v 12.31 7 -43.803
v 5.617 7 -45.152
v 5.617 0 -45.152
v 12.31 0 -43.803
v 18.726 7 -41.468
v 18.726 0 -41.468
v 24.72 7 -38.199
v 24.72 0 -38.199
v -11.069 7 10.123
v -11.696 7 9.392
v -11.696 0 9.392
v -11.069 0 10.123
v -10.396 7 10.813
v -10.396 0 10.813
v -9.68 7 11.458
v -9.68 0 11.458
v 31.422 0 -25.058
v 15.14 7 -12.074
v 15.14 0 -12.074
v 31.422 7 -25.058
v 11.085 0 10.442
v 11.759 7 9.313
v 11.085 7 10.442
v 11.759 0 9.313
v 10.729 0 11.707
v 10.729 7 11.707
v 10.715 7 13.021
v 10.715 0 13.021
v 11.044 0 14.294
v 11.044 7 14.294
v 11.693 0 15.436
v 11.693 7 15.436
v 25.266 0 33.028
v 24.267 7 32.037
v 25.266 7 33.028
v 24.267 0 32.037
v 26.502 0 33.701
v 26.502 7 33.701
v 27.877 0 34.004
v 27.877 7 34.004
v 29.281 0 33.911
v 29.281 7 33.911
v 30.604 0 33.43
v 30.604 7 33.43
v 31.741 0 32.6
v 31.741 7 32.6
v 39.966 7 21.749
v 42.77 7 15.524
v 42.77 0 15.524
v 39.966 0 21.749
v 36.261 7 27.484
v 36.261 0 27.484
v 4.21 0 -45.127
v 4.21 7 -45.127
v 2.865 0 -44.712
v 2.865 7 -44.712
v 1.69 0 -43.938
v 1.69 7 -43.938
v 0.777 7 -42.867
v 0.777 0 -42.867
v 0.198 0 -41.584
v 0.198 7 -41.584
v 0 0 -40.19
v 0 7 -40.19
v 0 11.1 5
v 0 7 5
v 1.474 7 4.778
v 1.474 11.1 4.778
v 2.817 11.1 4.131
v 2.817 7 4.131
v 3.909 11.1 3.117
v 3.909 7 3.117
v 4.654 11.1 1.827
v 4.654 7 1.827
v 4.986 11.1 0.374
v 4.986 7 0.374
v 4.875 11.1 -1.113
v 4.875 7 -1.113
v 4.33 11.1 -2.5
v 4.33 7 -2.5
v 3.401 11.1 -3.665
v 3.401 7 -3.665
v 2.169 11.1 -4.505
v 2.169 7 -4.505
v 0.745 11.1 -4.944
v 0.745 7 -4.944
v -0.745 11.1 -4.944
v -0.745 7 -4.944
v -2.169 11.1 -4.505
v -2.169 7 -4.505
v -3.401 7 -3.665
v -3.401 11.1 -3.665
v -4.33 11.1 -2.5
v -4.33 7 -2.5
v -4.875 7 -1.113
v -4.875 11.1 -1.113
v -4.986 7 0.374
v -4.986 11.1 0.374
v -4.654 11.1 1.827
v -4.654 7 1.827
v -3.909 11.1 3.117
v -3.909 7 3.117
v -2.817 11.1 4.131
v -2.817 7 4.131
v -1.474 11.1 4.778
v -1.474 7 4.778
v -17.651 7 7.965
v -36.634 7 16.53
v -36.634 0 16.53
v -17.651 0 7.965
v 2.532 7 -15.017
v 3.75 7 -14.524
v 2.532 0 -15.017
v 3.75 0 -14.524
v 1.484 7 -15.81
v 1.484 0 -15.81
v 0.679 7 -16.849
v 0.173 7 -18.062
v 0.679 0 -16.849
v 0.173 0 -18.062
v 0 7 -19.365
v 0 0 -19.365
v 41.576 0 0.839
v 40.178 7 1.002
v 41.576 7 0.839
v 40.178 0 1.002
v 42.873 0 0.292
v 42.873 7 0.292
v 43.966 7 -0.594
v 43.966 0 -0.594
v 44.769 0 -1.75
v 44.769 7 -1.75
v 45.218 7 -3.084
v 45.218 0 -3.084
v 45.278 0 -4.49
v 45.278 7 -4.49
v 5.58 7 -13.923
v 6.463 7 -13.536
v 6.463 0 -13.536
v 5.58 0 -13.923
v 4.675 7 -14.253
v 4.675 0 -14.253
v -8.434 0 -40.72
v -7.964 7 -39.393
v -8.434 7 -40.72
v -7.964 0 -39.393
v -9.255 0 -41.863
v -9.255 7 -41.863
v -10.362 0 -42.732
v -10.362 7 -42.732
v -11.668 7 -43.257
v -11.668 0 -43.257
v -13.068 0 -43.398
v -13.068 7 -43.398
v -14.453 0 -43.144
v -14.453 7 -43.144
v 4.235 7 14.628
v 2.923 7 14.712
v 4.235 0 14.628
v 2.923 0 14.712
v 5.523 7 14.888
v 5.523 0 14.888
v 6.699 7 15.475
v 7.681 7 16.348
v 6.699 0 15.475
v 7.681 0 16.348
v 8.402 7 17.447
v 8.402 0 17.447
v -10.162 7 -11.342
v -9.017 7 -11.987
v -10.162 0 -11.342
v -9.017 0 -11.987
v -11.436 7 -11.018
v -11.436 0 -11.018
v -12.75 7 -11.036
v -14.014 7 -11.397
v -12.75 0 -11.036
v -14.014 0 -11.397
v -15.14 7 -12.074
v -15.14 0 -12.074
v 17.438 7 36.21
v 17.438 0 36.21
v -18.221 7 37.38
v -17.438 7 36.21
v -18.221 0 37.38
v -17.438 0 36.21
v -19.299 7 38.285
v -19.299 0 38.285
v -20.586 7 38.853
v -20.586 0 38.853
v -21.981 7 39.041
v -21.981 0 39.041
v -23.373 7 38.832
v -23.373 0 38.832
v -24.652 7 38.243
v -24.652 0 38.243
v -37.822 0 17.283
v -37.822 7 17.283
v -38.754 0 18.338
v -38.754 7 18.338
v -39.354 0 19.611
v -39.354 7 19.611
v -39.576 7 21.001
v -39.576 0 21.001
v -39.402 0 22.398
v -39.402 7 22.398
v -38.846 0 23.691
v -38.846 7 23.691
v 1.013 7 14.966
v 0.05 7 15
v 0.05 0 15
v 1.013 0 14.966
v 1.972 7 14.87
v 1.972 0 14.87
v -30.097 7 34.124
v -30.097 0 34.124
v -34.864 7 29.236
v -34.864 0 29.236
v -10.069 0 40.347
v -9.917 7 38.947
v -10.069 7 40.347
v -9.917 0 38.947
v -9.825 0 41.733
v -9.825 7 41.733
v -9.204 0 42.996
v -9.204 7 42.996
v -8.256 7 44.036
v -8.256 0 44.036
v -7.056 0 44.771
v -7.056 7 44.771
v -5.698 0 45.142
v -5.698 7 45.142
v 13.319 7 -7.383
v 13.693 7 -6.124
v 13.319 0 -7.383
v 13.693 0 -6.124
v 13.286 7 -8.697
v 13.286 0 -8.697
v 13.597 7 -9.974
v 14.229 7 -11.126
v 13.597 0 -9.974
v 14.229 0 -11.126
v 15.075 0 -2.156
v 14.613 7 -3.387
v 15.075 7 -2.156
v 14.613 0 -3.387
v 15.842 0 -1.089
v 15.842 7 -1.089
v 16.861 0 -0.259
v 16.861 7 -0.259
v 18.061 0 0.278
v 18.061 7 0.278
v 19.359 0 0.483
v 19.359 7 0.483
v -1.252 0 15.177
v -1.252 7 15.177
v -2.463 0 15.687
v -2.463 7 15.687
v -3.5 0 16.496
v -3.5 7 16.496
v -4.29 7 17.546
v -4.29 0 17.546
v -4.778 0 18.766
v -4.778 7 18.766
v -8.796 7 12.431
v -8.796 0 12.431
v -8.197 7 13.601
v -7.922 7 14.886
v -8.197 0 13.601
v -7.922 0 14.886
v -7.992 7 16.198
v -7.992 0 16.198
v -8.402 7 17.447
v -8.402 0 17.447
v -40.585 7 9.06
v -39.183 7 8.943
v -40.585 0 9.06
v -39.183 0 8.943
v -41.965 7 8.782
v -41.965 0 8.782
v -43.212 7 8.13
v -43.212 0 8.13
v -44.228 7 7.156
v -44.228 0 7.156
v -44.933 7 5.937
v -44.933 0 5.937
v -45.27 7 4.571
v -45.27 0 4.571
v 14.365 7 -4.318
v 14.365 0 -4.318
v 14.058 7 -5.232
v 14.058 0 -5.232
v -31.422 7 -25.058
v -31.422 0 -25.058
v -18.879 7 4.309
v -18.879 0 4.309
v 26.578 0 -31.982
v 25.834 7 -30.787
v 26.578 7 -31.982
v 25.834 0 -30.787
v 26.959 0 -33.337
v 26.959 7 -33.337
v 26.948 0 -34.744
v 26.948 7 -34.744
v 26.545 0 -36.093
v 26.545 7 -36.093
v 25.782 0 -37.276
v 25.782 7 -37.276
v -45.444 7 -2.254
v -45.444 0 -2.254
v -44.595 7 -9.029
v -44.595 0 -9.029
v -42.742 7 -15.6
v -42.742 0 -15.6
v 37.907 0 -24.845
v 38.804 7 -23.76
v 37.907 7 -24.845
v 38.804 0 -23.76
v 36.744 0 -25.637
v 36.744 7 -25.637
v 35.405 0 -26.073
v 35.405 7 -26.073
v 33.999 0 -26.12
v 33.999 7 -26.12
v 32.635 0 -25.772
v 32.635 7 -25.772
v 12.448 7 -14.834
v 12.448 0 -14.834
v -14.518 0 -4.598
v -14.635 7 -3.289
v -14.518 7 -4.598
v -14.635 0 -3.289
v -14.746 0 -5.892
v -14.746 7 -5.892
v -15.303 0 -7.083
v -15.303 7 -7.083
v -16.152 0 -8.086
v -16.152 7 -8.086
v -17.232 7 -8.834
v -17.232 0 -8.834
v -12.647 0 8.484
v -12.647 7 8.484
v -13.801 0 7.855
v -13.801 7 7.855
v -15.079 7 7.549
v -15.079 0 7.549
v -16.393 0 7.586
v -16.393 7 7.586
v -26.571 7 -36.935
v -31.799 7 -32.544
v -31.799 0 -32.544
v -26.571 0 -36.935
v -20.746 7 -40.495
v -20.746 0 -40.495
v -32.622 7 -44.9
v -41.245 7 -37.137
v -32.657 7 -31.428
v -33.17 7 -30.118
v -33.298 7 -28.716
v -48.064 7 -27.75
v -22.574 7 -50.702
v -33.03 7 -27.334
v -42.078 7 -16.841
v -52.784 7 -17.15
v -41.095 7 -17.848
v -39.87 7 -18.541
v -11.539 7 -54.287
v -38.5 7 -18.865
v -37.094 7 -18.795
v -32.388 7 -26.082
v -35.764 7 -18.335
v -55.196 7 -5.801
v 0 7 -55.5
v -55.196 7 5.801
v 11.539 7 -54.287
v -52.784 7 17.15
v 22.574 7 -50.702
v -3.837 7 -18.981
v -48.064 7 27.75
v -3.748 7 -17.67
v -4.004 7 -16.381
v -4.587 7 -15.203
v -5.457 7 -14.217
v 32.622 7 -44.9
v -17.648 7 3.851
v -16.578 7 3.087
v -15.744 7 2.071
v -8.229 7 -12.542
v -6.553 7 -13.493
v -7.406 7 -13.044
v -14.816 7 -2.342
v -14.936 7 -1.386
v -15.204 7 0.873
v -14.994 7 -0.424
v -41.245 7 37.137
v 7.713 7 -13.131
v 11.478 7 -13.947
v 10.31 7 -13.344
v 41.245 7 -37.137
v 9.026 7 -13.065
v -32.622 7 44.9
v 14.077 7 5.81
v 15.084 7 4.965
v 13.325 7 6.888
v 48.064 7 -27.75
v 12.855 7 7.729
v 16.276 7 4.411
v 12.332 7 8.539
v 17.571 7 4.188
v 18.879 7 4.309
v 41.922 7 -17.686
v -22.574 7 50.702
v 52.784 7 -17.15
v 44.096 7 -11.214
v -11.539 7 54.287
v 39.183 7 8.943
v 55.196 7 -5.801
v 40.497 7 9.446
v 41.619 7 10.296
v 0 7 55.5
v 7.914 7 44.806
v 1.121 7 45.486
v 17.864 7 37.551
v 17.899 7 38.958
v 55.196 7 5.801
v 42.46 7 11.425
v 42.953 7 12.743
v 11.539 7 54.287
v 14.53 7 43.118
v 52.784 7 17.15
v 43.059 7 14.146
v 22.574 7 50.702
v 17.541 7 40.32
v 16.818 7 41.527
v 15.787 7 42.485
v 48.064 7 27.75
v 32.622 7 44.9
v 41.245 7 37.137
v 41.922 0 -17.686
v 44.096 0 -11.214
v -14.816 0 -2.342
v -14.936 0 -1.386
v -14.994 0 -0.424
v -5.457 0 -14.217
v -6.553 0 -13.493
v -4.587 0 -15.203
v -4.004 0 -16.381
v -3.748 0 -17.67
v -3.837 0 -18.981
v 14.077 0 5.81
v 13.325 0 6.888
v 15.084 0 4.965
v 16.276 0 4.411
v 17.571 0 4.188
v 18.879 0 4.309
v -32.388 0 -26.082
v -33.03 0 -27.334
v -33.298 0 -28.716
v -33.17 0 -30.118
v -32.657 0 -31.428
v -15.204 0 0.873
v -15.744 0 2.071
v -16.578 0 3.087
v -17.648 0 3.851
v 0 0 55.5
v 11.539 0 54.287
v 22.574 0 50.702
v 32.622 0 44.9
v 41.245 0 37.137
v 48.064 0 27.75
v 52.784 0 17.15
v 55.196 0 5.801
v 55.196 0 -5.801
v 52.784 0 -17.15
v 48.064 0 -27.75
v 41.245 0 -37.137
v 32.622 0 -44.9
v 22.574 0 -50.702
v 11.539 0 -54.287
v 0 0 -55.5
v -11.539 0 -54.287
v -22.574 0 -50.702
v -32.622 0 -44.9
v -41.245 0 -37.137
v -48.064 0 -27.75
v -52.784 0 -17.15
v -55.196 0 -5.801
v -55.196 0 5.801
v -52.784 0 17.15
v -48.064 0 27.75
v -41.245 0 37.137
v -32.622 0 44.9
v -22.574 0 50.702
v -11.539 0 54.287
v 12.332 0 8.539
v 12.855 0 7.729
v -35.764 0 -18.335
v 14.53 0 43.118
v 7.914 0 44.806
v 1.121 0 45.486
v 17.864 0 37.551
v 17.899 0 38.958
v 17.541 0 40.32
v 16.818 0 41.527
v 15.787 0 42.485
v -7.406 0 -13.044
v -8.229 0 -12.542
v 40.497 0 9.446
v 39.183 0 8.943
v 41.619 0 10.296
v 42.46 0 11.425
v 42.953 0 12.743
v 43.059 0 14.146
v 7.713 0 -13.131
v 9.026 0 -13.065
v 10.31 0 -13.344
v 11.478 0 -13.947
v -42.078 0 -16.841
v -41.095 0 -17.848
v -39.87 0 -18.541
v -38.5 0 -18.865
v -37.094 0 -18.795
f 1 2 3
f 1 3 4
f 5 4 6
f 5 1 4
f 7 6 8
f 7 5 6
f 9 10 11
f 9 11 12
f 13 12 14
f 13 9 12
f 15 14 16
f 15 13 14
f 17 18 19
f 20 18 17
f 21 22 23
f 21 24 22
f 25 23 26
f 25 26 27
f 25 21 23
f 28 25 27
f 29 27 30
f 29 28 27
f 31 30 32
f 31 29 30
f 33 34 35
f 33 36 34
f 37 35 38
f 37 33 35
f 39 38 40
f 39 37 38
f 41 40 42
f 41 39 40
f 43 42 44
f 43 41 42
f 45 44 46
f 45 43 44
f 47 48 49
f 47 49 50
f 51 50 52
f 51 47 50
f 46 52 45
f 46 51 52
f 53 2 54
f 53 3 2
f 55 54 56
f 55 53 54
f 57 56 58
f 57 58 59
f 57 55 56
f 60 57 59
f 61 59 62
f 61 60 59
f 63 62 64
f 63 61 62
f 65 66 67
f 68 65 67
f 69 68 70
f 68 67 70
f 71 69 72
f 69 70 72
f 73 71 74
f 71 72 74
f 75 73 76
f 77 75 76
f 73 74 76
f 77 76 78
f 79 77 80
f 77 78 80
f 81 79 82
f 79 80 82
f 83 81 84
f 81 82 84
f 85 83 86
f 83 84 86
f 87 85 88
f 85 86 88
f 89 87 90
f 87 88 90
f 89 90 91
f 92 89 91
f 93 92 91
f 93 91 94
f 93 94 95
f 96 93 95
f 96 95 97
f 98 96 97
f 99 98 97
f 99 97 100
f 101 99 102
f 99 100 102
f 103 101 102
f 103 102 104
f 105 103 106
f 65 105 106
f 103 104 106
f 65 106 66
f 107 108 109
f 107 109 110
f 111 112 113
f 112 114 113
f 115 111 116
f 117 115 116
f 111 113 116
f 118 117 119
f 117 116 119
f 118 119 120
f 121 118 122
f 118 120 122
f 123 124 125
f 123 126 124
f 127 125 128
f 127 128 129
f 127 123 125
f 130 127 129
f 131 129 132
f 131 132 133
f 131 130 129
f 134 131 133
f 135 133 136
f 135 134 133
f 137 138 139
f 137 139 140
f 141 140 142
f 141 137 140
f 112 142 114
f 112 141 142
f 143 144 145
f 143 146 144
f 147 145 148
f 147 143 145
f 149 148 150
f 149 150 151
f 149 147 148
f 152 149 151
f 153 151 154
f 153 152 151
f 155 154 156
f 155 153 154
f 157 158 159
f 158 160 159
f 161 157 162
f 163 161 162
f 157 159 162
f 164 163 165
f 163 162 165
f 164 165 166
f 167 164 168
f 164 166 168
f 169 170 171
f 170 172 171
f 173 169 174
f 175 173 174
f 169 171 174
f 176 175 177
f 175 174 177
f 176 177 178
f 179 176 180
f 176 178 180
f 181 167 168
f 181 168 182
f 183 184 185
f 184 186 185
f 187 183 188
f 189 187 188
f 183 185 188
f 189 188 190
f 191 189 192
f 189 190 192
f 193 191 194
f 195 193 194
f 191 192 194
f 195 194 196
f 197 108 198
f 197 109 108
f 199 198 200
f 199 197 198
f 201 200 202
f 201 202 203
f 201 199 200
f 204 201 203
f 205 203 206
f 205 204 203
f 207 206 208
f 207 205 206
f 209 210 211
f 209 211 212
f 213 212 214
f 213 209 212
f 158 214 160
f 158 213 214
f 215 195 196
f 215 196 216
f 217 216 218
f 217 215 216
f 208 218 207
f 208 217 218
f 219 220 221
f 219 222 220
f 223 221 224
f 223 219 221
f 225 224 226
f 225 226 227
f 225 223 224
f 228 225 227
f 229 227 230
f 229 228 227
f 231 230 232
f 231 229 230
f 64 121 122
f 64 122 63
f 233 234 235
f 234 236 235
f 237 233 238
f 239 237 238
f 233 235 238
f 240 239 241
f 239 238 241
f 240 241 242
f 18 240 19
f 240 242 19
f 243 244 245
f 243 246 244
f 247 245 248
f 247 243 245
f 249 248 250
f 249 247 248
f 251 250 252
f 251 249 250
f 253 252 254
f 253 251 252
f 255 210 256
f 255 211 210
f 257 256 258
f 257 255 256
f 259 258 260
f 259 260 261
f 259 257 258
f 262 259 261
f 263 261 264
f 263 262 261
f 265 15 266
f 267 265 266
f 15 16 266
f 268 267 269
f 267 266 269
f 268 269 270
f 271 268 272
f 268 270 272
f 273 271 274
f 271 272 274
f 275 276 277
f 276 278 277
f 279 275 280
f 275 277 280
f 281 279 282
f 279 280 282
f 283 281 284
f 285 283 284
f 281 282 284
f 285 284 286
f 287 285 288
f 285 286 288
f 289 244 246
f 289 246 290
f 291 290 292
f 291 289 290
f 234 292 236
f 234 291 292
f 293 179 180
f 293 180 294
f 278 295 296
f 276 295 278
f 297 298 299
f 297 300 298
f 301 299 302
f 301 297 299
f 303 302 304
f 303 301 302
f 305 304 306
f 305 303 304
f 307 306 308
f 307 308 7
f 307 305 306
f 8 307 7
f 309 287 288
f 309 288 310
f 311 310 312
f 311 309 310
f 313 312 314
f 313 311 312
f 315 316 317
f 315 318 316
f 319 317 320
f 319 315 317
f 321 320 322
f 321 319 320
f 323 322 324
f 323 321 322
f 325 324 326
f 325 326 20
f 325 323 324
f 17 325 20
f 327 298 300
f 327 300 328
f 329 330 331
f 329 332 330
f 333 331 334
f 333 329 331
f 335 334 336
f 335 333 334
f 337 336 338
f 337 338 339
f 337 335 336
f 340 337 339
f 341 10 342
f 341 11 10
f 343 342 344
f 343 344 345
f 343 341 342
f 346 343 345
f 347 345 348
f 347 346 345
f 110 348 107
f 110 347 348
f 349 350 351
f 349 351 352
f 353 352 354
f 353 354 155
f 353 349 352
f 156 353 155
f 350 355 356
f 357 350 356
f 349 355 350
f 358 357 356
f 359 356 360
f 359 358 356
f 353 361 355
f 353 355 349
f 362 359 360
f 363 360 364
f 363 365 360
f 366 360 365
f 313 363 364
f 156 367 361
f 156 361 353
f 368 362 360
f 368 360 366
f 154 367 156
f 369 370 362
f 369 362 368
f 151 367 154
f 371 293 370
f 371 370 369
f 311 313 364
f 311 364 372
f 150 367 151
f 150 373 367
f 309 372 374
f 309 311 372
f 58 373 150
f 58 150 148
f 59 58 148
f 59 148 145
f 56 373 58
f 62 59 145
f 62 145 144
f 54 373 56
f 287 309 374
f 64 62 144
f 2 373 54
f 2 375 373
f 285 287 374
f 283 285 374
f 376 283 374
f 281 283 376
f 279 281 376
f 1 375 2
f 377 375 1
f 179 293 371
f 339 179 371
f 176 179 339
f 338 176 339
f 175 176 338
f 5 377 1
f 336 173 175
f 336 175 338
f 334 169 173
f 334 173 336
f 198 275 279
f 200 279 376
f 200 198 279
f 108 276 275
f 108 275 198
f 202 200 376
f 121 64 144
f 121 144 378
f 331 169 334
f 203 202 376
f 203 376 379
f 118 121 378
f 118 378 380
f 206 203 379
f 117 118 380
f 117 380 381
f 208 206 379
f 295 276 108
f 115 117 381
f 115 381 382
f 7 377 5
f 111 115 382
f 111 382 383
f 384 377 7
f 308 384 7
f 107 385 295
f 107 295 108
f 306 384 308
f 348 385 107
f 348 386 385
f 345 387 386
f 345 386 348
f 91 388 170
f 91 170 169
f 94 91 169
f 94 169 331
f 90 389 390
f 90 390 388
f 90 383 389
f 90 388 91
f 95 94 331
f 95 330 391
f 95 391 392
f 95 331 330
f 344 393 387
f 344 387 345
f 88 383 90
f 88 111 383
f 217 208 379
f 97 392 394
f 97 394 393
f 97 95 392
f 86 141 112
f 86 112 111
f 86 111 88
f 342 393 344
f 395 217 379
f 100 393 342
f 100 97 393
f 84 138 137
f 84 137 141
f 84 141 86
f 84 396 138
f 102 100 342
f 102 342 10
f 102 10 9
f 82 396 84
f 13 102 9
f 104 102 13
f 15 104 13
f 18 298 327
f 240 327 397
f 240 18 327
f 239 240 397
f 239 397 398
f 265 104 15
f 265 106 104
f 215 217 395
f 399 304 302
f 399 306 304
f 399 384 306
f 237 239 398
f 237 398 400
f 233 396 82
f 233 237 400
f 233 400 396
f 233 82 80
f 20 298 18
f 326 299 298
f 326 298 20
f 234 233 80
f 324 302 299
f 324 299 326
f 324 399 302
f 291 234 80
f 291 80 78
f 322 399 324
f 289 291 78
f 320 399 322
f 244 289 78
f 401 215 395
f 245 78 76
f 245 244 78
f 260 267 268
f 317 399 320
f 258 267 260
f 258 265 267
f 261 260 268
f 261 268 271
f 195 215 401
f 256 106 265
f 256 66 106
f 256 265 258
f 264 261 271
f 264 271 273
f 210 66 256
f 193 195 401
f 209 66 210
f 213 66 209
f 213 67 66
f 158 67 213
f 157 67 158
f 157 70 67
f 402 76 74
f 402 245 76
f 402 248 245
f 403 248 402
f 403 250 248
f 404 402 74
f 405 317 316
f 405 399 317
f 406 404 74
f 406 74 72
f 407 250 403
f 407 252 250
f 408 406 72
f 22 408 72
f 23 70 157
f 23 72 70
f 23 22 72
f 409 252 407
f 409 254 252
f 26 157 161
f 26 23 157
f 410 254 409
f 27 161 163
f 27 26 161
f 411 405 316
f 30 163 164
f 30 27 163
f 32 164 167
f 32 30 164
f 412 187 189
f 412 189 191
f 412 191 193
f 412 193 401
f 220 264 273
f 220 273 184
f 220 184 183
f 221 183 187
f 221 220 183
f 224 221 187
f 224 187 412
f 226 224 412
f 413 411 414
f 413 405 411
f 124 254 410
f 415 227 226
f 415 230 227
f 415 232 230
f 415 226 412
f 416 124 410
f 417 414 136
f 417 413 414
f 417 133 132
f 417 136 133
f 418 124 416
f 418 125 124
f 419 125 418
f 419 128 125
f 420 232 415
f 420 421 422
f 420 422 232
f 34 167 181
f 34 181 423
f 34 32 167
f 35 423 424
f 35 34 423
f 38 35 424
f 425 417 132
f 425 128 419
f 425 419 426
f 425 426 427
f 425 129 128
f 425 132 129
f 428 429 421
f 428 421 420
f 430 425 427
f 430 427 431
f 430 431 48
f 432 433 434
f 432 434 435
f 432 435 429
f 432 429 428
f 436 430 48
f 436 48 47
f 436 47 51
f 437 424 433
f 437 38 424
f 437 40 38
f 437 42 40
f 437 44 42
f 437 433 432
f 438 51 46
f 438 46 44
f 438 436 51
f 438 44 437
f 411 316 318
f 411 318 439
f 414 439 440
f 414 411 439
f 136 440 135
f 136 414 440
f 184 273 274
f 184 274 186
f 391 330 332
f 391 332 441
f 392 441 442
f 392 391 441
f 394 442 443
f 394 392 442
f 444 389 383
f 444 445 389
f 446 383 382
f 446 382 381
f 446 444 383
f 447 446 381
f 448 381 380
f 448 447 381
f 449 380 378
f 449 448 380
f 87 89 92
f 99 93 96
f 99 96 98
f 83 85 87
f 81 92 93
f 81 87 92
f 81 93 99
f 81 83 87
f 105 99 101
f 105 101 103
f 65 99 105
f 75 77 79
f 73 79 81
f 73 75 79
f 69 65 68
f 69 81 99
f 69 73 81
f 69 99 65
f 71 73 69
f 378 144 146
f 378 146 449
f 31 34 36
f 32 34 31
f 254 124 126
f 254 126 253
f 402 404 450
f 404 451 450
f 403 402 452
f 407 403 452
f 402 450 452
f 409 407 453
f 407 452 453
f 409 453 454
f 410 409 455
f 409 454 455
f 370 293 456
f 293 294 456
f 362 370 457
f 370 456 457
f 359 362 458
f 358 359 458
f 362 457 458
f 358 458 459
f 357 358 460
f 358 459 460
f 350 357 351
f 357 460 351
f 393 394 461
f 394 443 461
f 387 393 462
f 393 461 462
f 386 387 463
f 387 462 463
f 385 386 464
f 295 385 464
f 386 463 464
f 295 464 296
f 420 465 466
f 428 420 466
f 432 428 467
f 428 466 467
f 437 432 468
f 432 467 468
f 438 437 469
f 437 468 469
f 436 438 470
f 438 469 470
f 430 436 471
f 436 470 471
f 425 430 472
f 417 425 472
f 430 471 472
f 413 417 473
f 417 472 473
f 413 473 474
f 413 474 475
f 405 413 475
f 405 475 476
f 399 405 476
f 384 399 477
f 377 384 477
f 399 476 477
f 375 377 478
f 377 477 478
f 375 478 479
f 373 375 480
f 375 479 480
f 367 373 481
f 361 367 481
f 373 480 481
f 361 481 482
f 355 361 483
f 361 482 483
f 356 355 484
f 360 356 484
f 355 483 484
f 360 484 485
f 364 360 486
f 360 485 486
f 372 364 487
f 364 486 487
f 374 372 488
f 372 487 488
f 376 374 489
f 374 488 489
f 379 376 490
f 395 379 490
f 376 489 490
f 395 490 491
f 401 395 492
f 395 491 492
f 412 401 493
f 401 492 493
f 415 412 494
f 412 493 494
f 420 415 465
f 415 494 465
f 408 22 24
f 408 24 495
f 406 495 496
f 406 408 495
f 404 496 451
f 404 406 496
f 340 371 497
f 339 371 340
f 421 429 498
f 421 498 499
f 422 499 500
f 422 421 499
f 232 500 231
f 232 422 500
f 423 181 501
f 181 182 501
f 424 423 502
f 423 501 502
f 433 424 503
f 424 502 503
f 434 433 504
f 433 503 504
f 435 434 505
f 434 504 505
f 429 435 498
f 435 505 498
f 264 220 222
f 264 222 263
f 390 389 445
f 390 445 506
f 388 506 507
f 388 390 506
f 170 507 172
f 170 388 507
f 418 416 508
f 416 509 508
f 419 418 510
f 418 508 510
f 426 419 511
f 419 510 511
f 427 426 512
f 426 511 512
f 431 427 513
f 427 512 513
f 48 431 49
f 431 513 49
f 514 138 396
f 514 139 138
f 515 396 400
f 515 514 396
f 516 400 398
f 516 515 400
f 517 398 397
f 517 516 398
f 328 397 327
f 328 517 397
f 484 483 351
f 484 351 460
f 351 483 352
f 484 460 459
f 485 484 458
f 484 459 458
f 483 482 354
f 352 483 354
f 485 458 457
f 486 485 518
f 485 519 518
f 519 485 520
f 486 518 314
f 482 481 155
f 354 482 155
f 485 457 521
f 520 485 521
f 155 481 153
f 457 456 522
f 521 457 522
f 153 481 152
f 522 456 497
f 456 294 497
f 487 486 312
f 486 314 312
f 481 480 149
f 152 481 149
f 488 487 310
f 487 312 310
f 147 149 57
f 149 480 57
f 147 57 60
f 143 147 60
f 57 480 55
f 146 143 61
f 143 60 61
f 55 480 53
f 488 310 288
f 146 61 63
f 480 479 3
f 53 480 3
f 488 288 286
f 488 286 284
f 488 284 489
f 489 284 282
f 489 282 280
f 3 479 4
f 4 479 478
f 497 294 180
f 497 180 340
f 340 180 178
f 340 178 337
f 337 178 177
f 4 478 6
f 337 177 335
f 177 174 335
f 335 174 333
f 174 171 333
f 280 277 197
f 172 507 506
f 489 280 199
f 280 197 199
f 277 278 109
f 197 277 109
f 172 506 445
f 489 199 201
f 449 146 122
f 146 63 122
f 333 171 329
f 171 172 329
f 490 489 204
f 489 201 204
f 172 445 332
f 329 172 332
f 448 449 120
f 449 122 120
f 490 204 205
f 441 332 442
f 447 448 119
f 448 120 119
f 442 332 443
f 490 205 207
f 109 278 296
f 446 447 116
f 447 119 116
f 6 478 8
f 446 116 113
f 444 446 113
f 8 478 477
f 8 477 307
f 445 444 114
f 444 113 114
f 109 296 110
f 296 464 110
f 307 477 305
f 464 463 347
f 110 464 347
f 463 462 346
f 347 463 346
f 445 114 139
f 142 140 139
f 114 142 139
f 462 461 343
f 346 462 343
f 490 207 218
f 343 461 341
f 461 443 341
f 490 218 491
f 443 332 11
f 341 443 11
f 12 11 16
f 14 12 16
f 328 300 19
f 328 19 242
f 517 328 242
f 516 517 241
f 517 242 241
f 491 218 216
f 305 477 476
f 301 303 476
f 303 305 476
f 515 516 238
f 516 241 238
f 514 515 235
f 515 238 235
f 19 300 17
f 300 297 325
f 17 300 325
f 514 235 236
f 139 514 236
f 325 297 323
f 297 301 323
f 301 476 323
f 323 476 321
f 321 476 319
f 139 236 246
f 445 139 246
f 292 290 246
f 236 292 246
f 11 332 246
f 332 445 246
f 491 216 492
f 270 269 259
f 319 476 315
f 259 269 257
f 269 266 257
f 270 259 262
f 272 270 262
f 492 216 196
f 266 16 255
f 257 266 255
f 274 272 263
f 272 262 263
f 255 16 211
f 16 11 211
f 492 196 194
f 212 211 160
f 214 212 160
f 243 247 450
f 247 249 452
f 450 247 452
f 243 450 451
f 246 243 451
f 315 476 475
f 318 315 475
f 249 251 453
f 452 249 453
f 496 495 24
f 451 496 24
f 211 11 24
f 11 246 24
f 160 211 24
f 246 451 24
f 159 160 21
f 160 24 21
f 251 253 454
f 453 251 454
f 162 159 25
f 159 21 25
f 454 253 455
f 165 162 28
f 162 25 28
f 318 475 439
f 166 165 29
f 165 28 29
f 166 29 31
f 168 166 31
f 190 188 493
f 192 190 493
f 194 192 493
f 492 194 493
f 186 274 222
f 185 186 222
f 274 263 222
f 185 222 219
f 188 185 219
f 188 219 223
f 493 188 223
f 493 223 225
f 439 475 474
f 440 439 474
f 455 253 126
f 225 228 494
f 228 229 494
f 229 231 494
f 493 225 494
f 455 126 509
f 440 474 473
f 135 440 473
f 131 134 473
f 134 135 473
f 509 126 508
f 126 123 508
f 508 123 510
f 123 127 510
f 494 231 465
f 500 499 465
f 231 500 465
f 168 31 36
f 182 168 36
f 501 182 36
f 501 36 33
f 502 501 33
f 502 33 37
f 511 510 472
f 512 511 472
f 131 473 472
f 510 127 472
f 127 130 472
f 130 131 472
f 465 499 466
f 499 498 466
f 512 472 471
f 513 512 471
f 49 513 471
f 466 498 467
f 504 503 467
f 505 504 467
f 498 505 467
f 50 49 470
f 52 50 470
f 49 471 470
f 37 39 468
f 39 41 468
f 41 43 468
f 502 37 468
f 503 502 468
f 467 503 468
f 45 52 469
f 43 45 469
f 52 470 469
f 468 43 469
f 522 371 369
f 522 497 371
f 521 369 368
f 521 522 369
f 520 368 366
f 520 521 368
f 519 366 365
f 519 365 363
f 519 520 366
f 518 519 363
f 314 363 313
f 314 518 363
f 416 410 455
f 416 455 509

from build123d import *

# Parameters (mm, degrees)
SKETCH1_R                = 55.5
BOSS_EXTRUDE1_DEPTH      = 7
CUT_EXTRUDE1_DEPTH       = 7
FILLET1_R                = 5
CIRPATTERN1_COUNT        = 7
FILLET1_OF_CIRPATTERN1_R = 5
SKETCH3_R                = 5
BOSS_EXTRUDE2_DEPTH      = 4.1


with BuildPart() as part:
    # Sketch1 → Boss-Extrude1 (new body)
    with BuildSketch(Plane(origin=(0, 0, 0), x_dir=(1, 0, 0), z_dir=(0, 1, 0))):
        with Locations(Location((0, 0, 0), (0, 0, 270))):
            Circle(SKETCH1_R)
    extrude(amount=BOSS_EXTRUDE1_DEPTH)

    # Sketch2 → Cut-Extrude1 (cut)
    with BuildSketch(Plane(origin=(0, 7, 0), x_dir=(1, 0, 0), z_dir=(0, 1, 0))):
        with BuildLine():
            Line((0, 15), (0, 45.5))
            ThreePointArc((0, 45.5), (15.561916521, 42.756014246), (29.246836241, 34.855022162))
            Line((29.246836241, 34.855022162), (9.641814145, 11.490666647))
            ThreePointArc((9.641814145, 11.490666647), (5.13030215, 14.095389312), (0, 15))
        make_face()
    cut_extrude1 = extrude(amount=-CUT_EXTRUDE1_DEPTH, mode=Mode.SUBTRACT)

    # Fillet1
    fillet1_edges = [part.edges().sort_by_distance(p)[0] for p in [
        (9.641814145, 3.5, -11.490666647),
        (0, 3.5, -15),
        (0, 3.5, -45.5),
        (29.246836241, 3.5, -34.855022162),
    ]]
    fillet(fillet1_edges, radius=FILLET1_R)

    # CirPattern1: Cut-Extrude1 ×7 about axis
    cirpattern1_axis = Axis((0, 0, 0), (0, 1, 0))
    for i in range(1, CIRPATTERN1_COUNT):
        add(cut_extrude1.rotate(cirpattern1_axis, i * 360 / CIRPATTERN1_COUNT), mode=Mode.SUBTRACT)

    # Fillet1 of CirPattern1
    fillet1_of_cirpattern1_edges = [part.edges().sort_by_distance(p)[0] for p in [
        (-2.972192148, 3.5, -14.702587318),
        (-11.727472237, 3.5, -9.352347028),
        (-35.573332452, 3.5, -28.368785985),
        (-9.015649516, 3.5, -44.597848197),
        (-13.348077132, 3.5, -6.84315986),
        (-14.623918683, 3.5, 3.337814009),
        (-44.359220004, 3.5, 10.124702495),
        (-40.489167301, 3.5, -20.75758491),
        (-13.672587785, 3.5, 6.169306547),
        (-6.508256087, 3.5, 13.514533019),
        (-19.74171013, 3.5, 40.99408349),
        (-41.47351628, 3.5, 18.713563192),
        (-3.701360965, 3.5, 14.536159293),
        (6.508256087, 3.5, 13.514533019),
        (19.74171013, 3.5, 40.99408349),
        (-11.227461595, 3.5, 44.093016523),
        (9.057066155, 3.5, 11.956987608),
        (14.623918683, 3.5, 3.337814009),
        (44.359220004, 3.5, 10.124702495),
        (27.47310067, 3.5, 36.269529079),
        (14.99533773, 3.5, 0.373960376),
        (11.727472237, 3.5, -9.352347028),
        (35.573332452, 3.5, -28.368785985),
        (45.485857781, 3.5, 1.134346474),
    ]]
    fillet(fillet1_of_cirpattern1_edges, radius=FILLET1_OF_CIRPATTERN1_R)

    # Sketch3 → Boss-Extrude2 (add)
    with BuildSketch(Plane(origin=(0, 7, 0), x_dir=(1, 0, 0), z_dir=(0, 1, 0))):
        with Locations(Location((0, 0, 0), (0, 0, 270))):
            Circle(SKETCH3_R)
    extrude(amount=BOSS_EXTRUDE2_DEPTH)


solid = part.part
